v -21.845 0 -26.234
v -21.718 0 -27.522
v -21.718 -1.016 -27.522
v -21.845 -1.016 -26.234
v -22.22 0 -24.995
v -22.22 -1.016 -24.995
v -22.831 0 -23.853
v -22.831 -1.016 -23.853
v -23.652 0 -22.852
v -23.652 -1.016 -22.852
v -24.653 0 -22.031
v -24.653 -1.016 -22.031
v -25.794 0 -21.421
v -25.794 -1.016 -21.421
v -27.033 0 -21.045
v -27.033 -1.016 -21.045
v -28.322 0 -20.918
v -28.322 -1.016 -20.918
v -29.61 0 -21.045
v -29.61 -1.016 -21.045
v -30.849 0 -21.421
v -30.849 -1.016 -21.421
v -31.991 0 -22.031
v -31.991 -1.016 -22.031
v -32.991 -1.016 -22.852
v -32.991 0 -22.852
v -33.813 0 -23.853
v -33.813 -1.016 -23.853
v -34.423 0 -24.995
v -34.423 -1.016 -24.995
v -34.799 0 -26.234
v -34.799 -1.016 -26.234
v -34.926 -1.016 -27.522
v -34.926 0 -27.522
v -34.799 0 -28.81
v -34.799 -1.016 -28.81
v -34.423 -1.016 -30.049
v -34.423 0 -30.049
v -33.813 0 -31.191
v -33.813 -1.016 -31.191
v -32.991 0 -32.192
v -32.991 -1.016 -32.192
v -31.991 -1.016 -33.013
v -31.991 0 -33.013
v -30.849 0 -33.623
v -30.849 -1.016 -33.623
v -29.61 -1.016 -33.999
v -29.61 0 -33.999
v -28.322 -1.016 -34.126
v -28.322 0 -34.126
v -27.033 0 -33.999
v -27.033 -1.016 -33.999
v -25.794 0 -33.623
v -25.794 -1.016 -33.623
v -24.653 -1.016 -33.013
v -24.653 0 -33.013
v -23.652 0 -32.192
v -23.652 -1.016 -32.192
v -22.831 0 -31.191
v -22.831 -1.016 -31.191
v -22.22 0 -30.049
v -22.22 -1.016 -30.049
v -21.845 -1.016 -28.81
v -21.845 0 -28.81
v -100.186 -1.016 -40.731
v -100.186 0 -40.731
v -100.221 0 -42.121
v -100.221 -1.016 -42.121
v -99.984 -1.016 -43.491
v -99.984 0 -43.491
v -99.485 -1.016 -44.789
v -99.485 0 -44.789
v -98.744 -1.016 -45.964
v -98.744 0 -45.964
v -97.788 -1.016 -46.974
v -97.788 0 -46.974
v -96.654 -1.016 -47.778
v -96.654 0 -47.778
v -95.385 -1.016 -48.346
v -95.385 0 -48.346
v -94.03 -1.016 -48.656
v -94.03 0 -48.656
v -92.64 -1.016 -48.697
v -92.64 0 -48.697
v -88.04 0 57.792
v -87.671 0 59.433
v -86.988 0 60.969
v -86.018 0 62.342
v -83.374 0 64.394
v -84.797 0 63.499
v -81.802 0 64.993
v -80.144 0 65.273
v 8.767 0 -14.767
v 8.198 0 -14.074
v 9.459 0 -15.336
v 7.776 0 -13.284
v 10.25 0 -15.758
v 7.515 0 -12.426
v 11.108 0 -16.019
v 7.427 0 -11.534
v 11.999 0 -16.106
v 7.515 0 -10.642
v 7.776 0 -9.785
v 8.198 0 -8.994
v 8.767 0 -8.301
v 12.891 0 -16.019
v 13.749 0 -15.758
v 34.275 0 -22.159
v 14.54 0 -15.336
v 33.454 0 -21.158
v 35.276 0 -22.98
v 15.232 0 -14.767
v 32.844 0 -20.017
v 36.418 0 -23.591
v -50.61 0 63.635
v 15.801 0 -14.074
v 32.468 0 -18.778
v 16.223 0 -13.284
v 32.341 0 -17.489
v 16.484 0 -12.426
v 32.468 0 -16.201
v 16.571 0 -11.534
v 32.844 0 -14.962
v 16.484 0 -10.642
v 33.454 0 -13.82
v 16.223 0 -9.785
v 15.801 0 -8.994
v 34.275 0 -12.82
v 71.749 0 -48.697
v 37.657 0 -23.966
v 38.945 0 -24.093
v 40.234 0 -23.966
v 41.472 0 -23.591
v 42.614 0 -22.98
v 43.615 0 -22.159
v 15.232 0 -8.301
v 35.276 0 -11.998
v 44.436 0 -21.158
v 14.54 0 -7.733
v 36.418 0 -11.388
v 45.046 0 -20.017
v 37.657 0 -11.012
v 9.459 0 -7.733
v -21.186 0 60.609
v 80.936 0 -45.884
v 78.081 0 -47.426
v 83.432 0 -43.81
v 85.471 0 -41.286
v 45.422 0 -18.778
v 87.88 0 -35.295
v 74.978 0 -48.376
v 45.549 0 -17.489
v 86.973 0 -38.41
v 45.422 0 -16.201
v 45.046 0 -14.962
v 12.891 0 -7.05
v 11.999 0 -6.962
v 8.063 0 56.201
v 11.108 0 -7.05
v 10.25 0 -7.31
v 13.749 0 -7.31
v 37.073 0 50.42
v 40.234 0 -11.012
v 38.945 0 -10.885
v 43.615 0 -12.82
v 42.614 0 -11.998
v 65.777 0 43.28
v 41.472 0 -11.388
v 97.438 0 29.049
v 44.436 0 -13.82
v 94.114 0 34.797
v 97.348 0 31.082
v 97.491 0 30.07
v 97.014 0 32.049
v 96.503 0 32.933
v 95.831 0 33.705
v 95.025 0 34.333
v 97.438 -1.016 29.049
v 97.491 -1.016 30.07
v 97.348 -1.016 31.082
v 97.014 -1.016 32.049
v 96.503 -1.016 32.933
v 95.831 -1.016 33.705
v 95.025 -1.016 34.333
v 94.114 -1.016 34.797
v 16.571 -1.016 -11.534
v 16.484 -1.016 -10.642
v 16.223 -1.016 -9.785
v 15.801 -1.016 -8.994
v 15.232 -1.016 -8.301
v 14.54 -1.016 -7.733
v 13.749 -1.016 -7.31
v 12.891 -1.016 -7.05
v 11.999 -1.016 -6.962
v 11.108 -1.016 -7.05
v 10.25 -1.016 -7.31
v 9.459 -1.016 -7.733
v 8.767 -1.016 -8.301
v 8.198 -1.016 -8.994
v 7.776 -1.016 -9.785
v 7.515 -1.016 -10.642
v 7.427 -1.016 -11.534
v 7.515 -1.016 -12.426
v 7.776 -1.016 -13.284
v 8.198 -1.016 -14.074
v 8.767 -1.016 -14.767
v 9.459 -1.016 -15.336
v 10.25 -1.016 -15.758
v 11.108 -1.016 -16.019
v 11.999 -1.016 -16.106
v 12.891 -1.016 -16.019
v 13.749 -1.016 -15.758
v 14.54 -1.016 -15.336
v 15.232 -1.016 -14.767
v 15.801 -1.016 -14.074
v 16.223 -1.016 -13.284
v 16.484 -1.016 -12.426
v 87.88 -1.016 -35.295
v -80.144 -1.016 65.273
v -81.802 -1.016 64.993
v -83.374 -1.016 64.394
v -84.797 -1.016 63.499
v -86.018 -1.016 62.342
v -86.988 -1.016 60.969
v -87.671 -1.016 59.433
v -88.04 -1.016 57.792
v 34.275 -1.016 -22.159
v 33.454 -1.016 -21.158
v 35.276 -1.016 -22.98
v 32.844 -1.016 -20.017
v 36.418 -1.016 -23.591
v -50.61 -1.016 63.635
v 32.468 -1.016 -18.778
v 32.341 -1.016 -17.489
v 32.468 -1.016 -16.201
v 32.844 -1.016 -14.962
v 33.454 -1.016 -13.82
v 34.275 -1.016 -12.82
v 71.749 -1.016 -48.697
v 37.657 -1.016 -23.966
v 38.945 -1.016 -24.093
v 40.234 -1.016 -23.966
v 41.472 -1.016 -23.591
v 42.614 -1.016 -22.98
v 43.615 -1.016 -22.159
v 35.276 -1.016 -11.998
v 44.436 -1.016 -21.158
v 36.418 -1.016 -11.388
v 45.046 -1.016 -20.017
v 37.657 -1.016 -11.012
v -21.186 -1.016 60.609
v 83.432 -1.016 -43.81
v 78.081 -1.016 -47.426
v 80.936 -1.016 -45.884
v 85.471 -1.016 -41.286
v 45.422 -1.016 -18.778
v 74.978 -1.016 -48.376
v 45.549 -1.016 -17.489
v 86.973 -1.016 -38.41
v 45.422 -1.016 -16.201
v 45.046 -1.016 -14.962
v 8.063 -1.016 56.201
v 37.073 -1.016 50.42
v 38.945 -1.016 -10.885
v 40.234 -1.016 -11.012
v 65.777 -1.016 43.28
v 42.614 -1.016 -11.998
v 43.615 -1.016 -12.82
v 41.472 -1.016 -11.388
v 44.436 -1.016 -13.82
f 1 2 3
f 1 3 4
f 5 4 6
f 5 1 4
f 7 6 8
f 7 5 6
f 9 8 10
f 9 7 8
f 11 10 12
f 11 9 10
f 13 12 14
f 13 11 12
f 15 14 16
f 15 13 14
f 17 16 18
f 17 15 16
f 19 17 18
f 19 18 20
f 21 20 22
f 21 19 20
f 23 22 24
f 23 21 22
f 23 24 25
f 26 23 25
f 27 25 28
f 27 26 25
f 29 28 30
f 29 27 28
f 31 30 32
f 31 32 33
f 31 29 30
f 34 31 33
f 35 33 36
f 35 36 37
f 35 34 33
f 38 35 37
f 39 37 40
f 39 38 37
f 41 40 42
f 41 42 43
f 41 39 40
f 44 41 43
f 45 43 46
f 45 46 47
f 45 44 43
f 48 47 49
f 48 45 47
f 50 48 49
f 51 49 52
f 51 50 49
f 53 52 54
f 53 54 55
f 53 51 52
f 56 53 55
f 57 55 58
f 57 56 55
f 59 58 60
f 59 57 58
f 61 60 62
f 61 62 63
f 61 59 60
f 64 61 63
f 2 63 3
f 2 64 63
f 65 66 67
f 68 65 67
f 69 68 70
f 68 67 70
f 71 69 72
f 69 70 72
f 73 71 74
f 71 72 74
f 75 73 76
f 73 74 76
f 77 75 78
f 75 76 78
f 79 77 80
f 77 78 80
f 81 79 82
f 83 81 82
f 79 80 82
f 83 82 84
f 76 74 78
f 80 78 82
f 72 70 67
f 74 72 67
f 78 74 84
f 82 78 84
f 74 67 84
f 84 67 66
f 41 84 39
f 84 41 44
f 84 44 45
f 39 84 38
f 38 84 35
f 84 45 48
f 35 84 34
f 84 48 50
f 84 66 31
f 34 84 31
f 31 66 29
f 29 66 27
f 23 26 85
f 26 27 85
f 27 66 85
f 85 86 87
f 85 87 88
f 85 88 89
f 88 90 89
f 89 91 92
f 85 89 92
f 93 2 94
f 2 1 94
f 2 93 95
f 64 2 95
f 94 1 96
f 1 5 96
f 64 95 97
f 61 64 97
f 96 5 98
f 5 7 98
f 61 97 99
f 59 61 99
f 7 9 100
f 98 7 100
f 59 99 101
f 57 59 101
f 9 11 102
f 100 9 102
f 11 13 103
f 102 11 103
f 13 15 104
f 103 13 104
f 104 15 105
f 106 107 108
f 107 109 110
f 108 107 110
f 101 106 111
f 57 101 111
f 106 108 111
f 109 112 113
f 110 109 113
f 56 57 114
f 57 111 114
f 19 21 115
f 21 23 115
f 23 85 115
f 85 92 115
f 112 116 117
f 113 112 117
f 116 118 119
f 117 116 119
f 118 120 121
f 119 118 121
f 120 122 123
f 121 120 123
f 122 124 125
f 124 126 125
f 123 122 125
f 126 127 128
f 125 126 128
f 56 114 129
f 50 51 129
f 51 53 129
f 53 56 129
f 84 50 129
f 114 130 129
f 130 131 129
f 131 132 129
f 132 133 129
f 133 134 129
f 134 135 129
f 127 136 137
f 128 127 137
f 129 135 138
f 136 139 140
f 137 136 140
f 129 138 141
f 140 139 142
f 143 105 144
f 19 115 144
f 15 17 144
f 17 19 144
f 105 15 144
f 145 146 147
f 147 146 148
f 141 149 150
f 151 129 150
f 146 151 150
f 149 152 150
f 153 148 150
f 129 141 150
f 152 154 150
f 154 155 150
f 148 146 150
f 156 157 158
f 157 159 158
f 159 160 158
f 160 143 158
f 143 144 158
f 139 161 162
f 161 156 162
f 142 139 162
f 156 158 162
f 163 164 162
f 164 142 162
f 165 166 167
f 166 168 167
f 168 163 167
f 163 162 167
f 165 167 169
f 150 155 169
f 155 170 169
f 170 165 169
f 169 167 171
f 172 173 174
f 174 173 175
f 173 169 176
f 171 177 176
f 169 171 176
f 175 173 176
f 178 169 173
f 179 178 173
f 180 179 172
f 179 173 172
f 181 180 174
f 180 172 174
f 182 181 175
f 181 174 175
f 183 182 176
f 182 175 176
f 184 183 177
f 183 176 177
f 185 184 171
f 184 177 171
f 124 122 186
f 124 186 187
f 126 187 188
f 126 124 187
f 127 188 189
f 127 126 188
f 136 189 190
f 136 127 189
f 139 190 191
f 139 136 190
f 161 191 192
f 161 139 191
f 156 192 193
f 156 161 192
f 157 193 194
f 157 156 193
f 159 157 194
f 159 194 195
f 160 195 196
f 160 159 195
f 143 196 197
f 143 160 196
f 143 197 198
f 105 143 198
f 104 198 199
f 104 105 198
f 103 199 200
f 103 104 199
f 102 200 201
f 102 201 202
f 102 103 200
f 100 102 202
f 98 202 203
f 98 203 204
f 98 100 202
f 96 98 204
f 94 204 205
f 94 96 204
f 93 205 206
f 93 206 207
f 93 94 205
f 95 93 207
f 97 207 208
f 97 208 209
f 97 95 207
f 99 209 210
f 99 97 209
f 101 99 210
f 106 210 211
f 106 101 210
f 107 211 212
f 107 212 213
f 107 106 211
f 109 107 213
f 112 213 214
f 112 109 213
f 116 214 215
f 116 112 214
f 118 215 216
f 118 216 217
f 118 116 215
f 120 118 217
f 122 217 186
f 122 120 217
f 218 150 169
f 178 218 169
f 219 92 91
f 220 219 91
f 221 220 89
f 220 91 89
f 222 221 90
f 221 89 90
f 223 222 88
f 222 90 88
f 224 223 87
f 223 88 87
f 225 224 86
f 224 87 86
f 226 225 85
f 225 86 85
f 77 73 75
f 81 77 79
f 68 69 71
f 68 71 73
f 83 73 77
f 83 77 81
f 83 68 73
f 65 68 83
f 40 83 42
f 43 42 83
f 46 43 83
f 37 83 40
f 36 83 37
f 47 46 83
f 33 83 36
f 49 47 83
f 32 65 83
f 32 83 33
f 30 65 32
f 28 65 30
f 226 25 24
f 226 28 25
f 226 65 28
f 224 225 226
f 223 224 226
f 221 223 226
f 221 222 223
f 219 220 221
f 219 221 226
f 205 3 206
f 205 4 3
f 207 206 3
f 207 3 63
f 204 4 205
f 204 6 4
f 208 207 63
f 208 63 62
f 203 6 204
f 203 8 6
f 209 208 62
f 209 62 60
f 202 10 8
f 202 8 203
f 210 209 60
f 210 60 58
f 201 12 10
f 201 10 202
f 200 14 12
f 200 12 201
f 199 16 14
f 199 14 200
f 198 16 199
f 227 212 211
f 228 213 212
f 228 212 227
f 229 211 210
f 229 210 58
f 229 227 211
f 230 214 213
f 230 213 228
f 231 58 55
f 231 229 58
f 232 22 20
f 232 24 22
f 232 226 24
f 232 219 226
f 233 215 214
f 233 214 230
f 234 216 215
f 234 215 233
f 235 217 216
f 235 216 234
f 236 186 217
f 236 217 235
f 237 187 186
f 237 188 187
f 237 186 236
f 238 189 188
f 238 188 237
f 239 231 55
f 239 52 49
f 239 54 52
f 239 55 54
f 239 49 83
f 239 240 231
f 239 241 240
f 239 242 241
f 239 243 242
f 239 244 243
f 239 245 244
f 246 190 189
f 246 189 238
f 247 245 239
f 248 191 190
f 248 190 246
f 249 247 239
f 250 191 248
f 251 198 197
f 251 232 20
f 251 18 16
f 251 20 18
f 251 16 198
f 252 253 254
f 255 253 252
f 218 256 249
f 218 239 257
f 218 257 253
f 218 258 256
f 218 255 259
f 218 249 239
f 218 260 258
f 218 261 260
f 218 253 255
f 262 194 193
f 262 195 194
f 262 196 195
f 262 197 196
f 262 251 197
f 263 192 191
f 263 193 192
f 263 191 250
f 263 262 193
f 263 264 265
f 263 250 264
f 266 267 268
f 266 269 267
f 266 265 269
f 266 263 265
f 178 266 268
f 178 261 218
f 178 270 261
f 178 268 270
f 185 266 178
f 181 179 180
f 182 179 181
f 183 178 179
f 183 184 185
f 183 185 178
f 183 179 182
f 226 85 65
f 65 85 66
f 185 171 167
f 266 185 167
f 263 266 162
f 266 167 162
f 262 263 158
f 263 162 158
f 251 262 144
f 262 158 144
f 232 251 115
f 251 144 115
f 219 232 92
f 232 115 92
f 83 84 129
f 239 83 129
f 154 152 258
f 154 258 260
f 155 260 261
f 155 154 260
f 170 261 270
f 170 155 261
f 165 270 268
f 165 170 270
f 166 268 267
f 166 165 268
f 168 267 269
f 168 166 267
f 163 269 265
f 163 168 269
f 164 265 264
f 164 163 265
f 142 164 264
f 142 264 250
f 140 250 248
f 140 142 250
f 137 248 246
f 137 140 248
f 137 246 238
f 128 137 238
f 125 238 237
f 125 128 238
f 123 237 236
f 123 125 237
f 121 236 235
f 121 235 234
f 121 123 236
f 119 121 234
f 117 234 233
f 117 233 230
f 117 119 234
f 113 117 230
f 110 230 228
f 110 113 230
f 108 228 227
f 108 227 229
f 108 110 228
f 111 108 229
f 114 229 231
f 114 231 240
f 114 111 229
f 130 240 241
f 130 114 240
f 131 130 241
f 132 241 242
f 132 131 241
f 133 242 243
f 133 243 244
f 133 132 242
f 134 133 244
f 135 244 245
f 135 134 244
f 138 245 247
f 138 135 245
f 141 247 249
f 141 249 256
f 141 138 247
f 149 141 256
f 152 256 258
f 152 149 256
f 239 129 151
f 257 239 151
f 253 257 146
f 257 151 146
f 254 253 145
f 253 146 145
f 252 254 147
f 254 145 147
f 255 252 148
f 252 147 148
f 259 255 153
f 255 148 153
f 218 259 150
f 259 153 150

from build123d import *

# Parameters (mm, degrees)
F1_DEPTH = 1.016
F0_R     = 6.604
F0_R_2   = 11.590192
F0_R_3   = 6.096
F0_R_4   = 4.572
F2_DEPTH = 1.016


with BuildPart() as f1:
    # F0 (on Front) → F1 (new body)
    with BuildSketch(Plane.XZ):
        with BuildLine():
            ThreePointArc((71.748899, -48.69655), (82.234953, -44.90898), (87.880266, -35.294748))
            Line((87.880266, -35.294748), (97.438355, 29.049238))
            ThreePointArc((97.438355, 29.049238), (96.779702, 32.50332), (94.114392, 34.796925))
            ThreePointArc((94.114392, 34.796925), (8.063382, 56.200754), (-80.144331, 65.272659))
            ThreePointArc((-80.144331, 65.272659), (-85.435827, 62.950768), (-88.040151, 57.792414))
            Line((-88.040151, 57.792414), (-100.186102, -40.73111))
            ThreePointArc((-100.186102, -40.73111), (-98.290515, -46.492526), (-92.639901, -48.69655))
            Line((-92.639901, -48.69655), (71.748899, -48.69655))
        make_face()
        with BuildLine():
            ThreePointArc((-68.658263, 50.559288), (4.937485, 42.307161), (77.003889, 25.252396))
            ThreePointArc((77.003889, 25.252396), (80.533579, 22.574015), (81.452525, 18.239506))
            Line((81.452525, 18.239506), (74.024657, -31.764068))
            ThreePointArc((74.024657, -31.764068), (72.957694, -33.701903), (70.884118, -34.472551))
            Line((70.884118, -34.472551), (33.536372, -34.472551))
            ThreePointArc((33.536372, -34.472551), (31.558624, -34.788397), (29.77762, -35.704516))
            ThreePointArc((29.77762, -35.704516), (11.863571, -41.576006), (-6.050479, -35.704516))
            ThreePointArc((-6.050479, -35.704516), (-7.831482, -34.788397), (-9.80923, -34.472551))
            Line((-9.80923, -34.472551), (-81.49242, -34.472551))
            ThreePointArc((-81.49242, -34.472551), (-83.870868, -33.40079), (-84.643565, -30.909079))
            Line((-84.643565, -30.909079), (-75.286183, 44.994587))
            ThreePointArc((-75.286183, 44.994587), (-73.066979, 49.080863), (-68.658263, 50.559288))
        make_face(mode=Mode.SUBTRACT)
    extrude(amount=F1_DEPTH)

    # F0 (on Front) → F2 (join)
    with BuildSketch(Plane.XZ):
        with BuildLine():
            ThreePointArc((81.452525, 18.239506), (80.533579, 22.574015), (77.003889, 25.252396))
            ThreePointArc((77.003889, 25.252396), (4.937485, 42.307161), (-68.658263, 50.559288))
            ThreePointArc((-68.658263, 50.559288), (-73.066979, 49.080863), (-75.286183, 44.994587))
            Line((-75.286183, 44.994587), (-84.643565, -30.909079))
            ThreePointArc((-84.643565, -30.909079), (-83.870868, -33.40079), (-81.49242, -34.472551))
            Line((-81.49242, -34.472551), (-9.80923, -34.472551))
            ThreePointArc((-9.80923, -34.472551), (-7.831482, -34.788397), (-6.050479, -35.704516))
            ThreePointArc((-6.050479, -35.704516), (11.863571, -41.576006), (29.77762, -35.704516))
            ThreePointArc((29.77762, -35.704516), (31.558624, -34.788397), (33.536372, -34.472551))
            Line((33.536372, -34.472551), (70.884118, -34.472551))
            ThreePointArc((70.884118, -34.472551), (72.957694, -33.701903), (74.024657, -31.764068))
            Line((74.024657, -31.764068), (81.452525, 18.239506))
        make_face()
        with Locations((-28.321732, -27.52208)):
            Circle(F0_R, mode=Mode.SUBTRACT)
        with Locations((11.999482, -11.534391)):
            Circle(F0_R_2, mode=Mode.SUBTRACT)
        with Locations((38.945176, -17.489335)):
            Circle(F0_R, mode=Mode.SUBTRACT)
        with Locations((11.999482, -11.534391)):
            Circle(F0_R_2)
        with Locations((11.999482, -11.534391)):
            Circle(F0_R_3, mode=Mode.SUBTRACT)
        with Locations((11.999482, -11.534391)):
            Circle(F0_R_3)
        with Locations((11.999482, -11.534391)):
            Circle(F0_R_4, mode=Mode.SUBTRACT)
    extrude(amount=F2_DEPTH)


solid = f1.part
